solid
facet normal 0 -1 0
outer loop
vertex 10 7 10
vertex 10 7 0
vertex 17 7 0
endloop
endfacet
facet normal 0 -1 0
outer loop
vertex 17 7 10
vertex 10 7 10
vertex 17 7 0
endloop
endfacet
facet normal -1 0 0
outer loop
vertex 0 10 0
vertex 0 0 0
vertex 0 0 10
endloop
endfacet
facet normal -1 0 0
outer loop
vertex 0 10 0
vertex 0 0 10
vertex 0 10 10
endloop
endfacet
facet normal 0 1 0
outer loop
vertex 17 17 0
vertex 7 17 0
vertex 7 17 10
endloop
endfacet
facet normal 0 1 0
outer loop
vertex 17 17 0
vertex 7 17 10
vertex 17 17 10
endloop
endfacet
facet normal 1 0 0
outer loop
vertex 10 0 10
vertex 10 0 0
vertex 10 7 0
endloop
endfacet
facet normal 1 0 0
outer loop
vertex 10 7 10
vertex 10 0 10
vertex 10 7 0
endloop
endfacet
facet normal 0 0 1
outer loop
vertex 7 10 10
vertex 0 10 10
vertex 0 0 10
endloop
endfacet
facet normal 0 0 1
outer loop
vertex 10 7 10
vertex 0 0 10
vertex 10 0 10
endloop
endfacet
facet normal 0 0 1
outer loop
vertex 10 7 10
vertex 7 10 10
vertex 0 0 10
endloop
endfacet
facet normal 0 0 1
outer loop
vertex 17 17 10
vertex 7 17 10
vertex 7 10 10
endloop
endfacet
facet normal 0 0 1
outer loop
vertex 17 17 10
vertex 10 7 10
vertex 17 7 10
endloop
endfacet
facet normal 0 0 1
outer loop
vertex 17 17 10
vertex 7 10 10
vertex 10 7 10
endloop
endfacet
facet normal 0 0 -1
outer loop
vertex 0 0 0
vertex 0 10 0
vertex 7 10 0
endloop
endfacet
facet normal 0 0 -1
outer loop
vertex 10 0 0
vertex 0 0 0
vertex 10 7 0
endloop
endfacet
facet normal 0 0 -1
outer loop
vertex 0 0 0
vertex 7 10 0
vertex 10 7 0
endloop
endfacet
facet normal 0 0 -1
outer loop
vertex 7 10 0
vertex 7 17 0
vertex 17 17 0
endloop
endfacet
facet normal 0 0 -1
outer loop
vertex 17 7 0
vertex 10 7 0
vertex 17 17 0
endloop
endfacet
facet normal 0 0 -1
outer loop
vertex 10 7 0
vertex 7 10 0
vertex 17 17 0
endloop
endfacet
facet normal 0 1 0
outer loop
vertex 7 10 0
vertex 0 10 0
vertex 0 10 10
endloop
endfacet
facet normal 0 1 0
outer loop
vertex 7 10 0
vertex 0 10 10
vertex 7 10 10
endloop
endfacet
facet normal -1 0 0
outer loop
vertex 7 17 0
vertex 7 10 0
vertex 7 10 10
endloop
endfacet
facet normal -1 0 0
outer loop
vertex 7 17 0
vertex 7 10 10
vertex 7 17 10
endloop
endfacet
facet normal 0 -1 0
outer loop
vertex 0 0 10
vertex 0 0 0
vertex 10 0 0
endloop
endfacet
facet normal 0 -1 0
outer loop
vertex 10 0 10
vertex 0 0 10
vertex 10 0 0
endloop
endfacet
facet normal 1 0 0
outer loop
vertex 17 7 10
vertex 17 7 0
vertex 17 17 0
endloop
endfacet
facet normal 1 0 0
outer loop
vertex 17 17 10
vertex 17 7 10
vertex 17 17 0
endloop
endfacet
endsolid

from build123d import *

# Parameters (mm, degrees)
BOX001_W     = 10
BOX001_H     = 10
BOX001_DEPTH = 10
BOX_W        = 10
BOX_H        = 10
BOX_DEPTH    = 10


with BuildPart() as cubo001:
    # Box001 → Box001 (new body)
    with BuildSketch(Plane(origin=(7, 7, 0), x_dir=(1, 0, 0), z_dir=(0, 0, 1))):
        with Locations((5, 5)):
            Rectangle(BOX001_W, BOX001_H)
    extrude(amount=BOX001_DEPTH)


with BuildPart() as fusion:
    # Box → Box (new body)
    with BuildSketch(Plane.XY):
        with Locations((5, 5)):
            Rectangle(BOX_W, BOX_H)
    extrude(amount=BOX_DEPTH)

    # Fusion: union Cubo001
    add(cubo001.part)


solid = fusion.part
